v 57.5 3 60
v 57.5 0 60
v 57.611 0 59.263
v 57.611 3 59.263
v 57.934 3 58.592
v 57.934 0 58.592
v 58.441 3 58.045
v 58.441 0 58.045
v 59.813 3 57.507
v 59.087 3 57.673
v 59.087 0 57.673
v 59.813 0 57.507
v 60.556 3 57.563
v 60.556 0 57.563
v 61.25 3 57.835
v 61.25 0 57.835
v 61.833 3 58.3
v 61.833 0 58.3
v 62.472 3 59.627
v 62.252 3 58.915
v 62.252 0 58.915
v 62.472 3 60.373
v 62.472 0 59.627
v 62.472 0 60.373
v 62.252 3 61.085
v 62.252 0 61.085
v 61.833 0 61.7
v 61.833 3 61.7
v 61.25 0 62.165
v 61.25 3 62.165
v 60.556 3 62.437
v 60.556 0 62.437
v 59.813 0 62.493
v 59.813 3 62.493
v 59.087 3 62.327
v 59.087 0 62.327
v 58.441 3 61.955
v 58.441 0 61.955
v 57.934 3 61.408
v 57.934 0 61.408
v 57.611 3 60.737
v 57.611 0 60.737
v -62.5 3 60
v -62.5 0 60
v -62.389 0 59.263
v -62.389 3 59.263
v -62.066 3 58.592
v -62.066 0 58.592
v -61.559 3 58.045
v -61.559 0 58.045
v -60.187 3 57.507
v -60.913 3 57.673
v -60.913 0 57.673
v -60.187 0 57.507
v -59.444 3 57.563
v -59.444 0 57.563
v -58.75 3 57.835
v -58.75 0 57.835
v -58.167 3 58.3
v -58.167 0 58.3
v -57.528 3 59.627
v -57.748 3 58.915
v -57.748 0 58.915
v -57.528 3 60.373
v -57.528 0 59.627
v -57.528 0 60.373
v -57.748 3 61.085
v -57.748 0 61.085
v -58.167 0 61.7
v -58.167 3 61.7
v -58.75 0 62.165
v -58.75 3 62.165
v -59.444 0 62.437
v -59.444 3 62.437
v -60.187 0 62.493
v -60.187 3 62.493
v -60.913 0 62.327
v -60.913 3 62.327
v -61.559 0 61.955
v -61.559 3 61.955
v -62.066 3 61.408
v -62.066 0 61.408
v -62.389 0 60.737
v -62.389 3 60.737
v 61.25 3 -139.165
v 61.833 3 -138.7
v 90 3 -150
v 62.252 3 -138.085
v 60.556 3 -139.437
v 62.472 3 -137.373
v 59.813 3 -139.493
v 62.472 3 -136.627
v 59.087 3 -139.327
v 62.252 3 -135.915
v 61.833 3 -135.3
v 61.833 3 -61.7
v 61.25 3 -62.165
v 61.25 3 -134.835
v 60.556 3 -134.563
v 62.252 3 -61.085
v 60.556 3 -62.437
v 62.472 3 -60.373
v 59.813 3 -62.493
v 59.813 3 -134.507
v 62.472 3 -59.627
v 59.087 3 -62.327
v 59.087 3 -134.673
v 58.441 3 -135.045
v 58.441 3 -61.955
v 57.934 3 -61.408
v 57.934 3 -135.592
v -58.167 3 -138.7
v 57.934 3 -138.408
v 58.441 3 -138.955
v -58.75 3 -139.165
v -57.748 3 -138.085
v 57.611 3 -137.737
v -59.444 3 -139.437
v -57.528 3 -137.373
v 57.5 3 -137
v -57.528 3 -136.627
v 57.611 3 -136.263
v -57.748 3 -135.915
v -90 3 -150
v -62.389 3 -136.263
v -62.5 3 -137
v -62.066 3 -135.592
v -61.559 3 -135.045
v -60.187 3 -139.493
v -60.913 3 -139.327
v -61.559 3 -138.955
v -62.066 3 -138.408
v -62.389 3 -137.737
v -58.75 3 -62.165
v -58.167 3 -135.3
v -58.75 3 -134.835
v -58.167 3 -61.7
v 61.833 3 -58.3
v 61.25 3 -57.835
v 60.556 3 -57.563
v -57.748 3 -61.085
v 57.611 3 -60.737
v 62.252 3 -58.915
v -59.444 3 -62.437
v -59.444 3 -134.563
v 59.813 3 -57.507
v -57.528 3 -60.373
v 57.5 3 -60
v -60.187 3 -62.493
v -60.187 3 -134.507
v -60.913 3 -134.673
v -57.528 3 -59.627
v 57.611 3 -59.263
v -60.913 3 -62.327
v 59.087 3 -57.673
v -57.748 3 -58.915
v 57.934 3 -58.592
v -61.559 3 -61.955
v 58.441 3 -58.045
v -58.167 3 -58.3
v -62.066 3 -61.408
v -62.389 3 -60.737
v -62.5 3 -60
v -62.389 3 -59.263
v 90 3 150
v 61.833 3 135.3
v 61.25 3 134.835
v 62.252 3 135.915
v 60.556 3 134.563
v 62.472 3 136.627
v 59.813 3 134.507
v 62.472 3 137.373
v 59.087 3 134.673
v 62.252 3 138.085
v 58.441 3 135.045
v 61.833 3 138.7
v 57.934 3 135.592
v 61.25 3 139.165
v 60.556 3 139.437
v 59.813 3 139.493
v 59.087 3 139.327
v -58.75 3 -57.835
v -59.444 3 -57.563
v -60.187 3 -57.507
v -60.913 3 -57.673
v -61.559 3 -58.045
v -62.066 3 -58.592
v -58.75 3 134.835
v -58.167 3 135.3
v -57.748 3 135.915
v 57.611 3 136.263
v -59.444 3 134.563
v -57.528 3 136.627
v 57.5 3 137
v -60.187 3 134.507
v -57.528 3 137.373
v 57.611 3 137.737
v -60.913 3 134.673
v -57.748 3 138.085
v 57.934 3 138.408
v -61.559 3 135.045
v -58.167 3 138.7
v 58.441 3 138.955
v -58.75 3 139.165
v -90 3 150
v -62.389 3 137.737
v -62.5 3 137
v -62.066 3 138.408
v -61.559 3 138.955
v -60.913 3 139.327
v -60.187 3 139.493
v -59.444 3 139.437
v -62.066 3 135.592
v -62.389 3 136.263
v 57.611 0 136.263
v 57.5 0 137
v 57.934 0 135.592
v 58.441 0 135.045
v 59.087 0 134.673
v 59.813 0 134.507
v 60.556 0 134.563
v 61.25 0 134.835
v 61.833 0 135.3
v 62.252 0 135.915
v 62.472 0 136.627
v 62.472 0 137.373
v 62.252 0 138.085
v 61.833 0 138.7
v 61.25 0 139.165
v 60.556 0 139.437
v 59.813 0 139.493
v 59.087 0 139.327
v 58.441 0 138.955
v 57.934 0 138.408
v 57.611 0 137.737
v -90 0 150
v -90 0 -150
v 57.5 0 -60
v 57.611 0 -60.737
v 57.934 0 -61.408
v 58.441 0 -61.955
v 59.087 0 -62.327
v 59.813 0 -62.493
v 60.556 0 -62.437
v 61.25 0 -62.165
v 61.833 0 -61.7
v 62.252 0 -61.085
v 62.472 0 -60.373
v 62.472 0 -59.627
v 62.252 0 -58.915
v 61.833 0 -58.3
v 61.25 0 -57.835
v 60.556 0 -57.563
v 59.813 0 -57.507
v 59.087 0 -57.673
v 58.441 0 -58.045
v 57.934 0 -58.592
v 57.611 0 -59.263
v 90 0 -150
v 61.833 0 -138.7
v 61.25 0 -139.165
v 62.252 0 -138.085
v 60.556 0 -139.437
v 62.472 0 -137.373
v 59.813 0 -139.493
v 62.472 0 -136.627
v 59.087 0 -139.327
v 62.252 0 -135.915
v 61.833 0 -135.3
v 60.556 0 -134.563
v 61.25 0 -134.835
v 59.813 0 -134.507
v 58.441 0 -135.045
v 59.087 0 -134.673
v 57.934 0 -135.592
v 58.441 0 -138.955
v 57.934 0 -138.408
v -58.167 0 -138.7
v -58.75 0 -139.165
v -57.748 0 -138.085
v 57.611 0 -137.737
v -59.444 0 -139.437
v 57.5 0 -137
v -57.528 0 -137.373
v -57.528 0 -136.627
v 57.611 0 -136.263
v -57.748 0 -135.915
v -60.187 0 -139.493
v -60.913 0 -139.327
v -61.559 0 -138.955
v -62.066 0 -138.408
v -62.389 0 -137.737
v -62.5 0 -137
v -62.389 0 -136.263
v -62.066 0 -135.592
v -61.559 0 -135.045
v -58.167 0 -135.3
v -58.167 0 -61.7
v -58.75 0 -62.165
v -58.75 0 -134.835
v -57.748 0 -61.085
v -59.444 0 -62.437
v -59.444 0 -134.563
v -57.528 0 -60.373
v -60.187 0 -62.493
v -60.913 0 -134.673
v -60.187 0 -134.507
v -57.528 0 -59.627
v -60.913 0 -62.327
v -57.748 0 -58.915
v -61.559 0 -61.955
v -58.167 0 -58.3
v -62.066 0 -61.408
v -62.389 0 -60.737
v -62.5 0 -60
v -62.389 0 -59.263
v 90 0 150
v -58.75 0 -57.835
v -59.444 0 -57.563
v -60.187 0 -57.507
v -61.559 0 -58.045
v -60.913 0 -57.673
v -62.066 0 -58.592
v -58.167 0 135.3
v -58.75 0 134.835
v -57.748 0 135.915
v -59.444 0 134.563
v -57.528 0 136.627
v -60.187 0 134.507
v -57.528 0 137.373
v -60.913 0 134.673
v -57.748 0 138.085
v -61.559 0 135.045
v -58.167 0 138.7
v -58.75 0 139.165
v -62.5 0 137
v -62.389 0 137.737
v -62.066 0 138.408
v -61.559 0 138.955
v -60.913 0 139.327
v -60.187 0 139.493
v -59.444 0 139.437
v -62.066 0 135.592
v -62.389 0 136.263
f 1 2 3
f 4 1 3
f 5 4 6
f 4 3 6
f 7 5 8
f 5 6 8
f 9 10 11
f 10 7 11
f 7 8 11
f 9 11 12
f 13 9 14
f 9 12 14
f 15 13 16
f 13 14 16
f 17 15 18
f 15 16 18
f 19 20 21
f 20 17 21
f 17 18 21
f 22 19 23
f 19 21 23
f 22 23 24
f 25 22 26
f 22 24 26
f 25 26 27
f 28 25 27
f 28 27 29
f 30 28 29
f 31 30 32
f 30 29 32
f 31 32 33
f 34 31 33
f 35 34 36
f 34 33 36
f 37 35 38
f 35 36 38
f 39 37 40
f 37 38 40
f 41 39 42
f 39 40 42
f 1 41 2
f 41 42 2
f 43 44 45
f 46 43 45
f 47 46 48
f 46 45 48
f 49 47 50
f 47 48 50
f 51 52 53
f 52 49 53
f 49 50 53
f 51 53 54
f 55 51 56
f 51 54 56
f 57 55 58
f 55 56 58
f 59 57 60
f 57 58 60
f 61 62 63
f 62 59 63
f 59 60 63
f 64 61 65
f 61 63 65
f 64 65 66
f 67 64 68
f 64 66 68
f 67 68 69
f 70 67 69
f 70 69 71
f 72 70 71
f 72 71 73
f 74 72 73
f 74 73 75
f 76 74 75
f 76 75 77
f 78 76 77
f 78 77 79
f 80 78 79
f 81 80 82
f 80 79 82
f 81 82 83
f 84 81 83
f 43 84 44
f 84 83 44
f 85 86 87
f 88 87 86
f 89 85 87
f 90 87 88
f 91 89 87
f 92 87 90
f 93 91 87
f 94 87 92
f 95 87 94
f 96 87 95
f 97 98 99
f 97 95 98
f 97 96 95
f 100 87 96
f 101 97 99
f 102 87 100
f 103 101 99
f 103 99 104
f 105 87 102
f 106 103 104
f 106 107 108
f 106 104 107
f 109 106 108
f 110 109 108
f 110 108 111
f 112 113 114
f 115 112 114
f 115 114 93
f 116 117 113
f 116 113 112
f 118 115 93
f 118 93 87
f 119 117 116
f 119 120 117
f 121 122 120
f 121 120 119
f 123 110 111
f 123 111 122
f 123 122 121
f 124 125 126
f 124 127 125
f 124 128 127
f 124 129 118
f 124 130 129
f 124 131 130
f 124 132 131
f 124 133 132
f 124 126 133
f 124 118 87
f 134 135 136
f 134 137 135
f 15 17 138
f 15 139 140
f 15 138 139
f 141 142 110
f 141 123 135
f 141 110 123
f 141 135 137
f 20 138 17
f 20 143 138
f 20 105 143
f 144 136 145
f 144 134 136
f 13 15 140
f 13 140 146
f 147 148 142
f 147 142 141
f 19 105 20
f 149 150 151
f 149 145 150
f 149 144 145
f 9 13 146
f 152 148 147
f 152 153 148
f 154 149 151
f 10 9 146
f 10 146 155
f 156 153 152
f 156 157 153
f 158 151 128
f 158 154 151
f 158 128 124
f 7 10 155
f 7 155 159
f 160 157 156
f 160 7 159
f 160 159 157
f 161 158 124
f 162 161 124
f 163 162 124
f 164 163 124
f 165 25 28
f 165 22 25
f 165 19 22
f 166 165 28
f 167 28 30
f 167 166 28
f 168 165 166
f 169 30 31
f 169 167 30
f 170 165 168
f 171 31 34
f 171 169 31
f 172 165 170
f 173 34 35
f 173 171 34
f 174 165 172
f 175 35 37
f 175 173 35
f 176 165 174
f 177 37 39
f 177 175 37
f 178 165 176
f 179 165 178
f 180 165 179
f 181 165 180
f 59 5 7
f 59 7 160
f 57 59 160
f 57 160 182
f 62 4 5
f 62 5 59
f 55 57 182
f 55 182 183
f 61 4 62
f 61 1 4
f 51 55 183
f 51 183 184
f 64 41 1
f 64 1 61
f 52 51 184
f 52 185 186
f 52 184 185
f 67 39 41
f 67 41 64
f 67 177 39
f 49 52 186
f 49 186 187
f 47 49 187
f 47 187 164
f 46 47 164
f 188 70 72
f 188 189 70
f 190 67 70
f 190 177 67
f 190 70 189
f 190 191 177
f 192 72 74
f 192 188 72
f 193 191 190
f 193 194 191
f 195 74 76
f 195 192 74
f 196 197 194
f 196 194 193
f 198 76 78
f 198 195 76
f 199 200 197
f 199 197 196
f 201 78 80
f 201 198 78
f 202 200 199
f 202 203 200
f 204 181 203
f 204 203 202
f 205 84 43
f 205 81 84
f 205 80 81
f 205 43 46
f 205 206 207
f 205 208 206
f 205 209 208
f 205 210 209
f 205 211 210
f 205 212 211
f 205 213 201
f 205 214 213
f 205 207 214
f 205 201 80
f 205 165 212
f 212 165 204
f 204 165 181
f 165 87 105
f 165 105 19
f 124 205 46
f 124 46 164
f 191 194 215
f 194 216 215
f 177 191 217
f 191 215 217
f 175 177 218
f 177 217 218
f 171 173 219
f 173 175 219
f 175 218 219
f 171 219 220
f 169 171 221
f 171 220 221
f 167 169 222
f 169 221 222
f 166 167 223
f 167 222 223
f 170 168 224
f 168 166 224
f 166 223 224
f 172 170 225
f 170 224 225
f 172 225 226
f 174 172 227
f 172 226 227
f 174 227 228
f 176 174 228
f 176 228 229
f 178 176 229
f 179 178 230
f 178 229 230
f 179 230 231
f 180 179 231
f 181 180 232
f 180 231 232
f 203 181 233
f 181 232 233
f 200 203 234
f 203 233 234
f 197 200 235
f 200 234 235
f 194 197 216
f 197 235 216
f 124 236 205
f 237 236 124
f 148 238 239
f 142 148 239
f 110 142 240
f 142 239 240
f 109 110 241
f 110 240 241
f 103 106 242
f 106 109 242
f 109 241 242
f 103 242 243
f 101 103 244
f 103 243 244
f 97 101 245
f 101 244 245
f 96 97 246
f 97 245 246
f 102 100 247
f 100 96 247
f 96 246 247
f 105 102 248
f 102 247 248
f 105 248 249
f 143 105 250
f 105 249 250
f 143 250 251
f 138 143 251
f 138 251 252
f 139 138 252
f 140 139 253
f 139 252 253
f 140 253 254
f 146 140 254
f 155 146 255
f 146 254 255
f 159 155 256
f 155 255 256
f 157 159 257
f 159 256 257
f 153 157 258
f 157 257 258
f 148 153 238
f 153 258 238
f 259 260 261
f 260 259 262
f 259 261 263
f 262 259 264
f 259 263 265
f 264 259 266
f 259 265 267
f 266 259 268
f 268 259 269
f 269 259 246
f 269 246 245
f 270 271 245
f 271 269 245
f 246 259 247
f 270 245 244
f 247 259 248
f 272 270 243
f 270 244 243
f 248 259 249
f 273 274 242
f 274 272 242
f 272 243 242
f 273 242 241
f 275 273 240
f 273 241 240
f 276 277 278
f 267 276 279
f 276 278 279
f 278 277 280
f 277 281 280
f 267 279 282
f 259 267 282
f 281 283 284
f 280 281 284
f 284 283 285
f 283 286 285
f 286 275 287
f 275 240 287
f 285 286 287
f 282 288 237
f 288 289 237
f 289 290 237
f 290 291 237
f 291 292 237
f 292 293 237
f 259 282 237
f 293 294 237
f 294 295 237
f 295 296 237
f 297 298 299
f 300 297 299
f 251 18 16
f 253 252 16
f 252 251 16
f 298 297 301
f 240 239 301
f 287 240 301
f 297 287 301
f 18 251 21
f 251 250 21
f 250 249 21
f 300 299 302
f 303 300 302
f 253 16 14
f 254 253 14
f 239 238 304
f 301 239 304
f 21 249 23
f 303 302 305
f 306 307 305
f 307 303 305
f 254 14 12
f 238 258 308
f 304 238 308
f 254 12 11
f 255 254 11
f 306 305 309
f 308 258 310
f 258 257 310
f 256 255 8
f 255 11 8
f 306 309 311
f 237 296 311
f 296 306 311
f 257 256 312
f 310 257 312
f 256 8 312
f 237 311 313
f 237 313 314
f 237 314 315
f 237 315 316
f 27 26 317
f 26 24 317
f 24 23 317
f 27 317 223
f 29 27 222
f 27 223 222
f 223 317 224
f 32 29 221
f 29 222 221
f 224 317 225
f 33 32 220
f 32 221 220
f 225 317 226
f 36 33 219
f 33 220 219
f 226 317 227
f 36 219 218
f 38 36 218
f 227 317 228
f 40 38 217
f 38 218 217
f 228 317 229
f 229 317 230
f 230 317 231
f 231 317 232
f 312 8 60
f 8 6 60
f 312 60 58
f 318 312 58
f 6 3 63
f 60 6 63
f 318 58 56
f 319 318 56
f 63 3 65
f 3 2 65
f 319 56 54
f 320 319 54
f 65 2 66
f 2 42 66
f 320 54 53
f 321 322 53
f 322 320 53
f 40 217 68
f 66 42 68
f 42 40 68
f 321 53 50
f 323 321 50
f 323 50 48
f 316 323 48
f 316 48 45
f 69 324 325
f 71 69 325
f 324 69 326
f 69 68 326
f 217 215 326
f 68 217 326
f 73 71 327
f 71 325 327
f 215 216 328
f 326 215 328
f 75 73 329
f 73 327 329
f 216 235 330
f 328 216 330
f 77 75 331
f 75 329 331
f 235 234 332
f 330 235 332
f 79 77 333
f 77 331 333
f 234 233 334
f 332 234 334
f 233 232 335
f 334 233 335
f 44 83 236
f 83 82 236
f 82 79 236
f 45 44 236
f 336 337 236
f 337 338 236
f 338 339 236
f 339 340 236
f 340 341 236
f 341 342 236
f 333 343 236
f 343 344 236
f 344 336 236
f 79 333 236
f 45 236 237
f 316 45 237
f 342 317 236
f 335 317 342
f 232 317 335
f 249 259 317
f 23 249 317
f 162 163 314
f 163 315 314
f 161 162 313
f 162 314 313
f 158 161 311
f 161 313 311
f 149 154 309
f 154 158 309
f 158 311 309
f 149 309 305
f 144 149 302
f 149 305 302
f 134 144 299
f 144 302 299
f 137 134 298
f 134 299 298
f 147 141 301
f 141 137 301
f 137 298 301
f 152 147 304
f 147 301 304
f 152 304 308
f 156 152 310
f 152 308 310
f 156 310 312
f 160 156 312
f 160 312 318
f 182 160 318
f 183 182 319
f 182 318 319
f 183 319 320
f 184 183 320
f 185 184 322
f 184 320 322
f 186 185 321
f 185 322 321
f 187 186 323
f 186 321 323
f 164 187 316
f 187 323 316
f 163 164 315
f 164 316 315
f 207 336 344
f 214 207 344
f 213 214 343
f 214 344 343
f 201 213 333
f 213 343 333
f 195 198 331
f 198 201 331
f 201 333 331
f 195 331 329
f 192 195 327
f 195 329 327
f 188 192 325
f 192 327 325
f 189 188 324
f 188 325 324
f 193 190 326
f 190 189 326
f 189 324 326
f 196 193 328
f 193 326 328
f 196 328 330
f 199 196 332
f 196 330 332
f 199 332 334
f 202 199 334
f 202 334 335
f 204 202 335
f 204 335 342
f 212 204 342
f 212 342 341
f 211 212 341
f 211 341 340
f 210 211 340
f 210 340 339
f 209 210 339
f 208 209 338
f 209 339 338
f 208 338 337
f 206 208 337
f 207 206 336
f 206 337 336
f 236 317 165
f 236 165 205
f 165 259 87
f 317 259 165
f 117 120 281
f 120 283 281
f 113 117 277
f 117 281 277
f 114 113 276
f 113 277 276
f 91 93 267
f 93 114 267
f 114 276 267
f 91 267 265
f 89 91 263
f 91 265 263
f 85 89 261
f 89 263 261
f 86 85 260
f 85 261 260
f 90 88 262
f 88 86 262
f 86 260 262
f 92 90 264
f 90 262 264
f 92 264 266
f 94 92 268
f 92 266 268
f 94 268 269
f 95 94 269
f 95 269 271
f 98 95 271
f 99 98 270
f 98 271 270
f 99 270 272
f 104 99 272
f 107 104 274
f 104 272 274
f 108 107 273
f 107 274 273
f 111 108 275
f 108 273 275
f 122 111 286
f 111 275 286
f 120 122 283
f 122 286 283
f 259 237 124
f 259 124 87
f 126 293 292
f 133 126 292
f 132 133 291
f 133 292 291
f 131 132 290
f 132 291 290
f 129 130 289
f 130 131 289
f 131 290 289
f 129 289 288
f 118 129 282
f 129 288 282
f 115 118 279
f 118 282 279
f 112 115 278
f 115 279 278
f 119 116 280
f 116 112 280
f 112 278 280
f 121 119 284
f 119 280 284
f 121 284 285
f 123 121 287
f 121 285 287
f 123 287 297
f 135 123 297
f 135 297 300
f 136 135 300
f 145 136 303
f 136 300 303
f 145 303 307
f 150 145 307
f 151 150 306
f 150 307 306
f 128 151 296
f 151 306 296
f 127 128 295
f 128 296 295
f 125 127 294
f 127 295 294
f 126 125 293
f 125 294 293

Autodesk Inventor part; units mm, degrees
ref_plane "YZ Plane" through (0, 0, 0) normal (1, 0, 0) x (0, 1, 0)
ref_plane "XZ Plane" through (0, 0, 0) normal (0, 1, 0) x (-1, 0, 0)
ref_plane "XY Plane" through (0, 0, 0) normal (0, 0, 1) x (1, 0, 0)
sketch "Sketch1" plane through (0, 0, 0) normal (0, 1, 0) x (-1, 0, 0)
  line L0 (-90, 150) -> (90, 150)
  line L1 (90, 150) -> (90, -150)
  line L2 (90, -150) -> (-90, -150)
  line L3 (-90, -150) -> (-90, 150)
  line L4 (-90, 150) -> (90, -150) construction
  line L5 (90, 150) -> (-90, -150) construction
  line L6 (-60, 60) -> (60, 60) construction
  line L7 (60, 60) -> (60, -60) construction
  line L8 (60, -60) -> (-60, -60) construction
  line L9 (-60, -60) -> (-60, 60) construction
  line L10 (-60, 60) -> (60, -60) construction
  line L11 (60, 60) -> (-60, -60) construction
  circle A0 centre (-60, 60) radius 2.5
  circle A1 centre (60, 60) radius 2.5
  circle A2 centre (60, -60) radius 2.5
  circle A3 centre (-60, -60) radius 2.5
  circle A4 centre (60, -137) radius 2.5
  circle A5 centre (-60, -137) radius 2.5
  circle A6 centre (60, 137) radius 2.5
  circle A7 centre (-60, 137) radius 2.5
  point P0 (0, 0)
  dimension "d0" = 180
  dimension "d1" = 300
  dimension "d2" = 120
  dimension "d3" = 120
  dimension "d4" = 5
  dimension "d5" = 5
  dimension "d6" = 5
  dimension "d7" = 5
  dimension "d10" = 5
  dimension "d13" = 120
  dimension "d16" = 274
  dimension "d19" = 13
  dimension "d20" = 30
extrude "Extrusion1" add sketch "Sketch1" along normal blind 3
properties part number "Base Plate"
